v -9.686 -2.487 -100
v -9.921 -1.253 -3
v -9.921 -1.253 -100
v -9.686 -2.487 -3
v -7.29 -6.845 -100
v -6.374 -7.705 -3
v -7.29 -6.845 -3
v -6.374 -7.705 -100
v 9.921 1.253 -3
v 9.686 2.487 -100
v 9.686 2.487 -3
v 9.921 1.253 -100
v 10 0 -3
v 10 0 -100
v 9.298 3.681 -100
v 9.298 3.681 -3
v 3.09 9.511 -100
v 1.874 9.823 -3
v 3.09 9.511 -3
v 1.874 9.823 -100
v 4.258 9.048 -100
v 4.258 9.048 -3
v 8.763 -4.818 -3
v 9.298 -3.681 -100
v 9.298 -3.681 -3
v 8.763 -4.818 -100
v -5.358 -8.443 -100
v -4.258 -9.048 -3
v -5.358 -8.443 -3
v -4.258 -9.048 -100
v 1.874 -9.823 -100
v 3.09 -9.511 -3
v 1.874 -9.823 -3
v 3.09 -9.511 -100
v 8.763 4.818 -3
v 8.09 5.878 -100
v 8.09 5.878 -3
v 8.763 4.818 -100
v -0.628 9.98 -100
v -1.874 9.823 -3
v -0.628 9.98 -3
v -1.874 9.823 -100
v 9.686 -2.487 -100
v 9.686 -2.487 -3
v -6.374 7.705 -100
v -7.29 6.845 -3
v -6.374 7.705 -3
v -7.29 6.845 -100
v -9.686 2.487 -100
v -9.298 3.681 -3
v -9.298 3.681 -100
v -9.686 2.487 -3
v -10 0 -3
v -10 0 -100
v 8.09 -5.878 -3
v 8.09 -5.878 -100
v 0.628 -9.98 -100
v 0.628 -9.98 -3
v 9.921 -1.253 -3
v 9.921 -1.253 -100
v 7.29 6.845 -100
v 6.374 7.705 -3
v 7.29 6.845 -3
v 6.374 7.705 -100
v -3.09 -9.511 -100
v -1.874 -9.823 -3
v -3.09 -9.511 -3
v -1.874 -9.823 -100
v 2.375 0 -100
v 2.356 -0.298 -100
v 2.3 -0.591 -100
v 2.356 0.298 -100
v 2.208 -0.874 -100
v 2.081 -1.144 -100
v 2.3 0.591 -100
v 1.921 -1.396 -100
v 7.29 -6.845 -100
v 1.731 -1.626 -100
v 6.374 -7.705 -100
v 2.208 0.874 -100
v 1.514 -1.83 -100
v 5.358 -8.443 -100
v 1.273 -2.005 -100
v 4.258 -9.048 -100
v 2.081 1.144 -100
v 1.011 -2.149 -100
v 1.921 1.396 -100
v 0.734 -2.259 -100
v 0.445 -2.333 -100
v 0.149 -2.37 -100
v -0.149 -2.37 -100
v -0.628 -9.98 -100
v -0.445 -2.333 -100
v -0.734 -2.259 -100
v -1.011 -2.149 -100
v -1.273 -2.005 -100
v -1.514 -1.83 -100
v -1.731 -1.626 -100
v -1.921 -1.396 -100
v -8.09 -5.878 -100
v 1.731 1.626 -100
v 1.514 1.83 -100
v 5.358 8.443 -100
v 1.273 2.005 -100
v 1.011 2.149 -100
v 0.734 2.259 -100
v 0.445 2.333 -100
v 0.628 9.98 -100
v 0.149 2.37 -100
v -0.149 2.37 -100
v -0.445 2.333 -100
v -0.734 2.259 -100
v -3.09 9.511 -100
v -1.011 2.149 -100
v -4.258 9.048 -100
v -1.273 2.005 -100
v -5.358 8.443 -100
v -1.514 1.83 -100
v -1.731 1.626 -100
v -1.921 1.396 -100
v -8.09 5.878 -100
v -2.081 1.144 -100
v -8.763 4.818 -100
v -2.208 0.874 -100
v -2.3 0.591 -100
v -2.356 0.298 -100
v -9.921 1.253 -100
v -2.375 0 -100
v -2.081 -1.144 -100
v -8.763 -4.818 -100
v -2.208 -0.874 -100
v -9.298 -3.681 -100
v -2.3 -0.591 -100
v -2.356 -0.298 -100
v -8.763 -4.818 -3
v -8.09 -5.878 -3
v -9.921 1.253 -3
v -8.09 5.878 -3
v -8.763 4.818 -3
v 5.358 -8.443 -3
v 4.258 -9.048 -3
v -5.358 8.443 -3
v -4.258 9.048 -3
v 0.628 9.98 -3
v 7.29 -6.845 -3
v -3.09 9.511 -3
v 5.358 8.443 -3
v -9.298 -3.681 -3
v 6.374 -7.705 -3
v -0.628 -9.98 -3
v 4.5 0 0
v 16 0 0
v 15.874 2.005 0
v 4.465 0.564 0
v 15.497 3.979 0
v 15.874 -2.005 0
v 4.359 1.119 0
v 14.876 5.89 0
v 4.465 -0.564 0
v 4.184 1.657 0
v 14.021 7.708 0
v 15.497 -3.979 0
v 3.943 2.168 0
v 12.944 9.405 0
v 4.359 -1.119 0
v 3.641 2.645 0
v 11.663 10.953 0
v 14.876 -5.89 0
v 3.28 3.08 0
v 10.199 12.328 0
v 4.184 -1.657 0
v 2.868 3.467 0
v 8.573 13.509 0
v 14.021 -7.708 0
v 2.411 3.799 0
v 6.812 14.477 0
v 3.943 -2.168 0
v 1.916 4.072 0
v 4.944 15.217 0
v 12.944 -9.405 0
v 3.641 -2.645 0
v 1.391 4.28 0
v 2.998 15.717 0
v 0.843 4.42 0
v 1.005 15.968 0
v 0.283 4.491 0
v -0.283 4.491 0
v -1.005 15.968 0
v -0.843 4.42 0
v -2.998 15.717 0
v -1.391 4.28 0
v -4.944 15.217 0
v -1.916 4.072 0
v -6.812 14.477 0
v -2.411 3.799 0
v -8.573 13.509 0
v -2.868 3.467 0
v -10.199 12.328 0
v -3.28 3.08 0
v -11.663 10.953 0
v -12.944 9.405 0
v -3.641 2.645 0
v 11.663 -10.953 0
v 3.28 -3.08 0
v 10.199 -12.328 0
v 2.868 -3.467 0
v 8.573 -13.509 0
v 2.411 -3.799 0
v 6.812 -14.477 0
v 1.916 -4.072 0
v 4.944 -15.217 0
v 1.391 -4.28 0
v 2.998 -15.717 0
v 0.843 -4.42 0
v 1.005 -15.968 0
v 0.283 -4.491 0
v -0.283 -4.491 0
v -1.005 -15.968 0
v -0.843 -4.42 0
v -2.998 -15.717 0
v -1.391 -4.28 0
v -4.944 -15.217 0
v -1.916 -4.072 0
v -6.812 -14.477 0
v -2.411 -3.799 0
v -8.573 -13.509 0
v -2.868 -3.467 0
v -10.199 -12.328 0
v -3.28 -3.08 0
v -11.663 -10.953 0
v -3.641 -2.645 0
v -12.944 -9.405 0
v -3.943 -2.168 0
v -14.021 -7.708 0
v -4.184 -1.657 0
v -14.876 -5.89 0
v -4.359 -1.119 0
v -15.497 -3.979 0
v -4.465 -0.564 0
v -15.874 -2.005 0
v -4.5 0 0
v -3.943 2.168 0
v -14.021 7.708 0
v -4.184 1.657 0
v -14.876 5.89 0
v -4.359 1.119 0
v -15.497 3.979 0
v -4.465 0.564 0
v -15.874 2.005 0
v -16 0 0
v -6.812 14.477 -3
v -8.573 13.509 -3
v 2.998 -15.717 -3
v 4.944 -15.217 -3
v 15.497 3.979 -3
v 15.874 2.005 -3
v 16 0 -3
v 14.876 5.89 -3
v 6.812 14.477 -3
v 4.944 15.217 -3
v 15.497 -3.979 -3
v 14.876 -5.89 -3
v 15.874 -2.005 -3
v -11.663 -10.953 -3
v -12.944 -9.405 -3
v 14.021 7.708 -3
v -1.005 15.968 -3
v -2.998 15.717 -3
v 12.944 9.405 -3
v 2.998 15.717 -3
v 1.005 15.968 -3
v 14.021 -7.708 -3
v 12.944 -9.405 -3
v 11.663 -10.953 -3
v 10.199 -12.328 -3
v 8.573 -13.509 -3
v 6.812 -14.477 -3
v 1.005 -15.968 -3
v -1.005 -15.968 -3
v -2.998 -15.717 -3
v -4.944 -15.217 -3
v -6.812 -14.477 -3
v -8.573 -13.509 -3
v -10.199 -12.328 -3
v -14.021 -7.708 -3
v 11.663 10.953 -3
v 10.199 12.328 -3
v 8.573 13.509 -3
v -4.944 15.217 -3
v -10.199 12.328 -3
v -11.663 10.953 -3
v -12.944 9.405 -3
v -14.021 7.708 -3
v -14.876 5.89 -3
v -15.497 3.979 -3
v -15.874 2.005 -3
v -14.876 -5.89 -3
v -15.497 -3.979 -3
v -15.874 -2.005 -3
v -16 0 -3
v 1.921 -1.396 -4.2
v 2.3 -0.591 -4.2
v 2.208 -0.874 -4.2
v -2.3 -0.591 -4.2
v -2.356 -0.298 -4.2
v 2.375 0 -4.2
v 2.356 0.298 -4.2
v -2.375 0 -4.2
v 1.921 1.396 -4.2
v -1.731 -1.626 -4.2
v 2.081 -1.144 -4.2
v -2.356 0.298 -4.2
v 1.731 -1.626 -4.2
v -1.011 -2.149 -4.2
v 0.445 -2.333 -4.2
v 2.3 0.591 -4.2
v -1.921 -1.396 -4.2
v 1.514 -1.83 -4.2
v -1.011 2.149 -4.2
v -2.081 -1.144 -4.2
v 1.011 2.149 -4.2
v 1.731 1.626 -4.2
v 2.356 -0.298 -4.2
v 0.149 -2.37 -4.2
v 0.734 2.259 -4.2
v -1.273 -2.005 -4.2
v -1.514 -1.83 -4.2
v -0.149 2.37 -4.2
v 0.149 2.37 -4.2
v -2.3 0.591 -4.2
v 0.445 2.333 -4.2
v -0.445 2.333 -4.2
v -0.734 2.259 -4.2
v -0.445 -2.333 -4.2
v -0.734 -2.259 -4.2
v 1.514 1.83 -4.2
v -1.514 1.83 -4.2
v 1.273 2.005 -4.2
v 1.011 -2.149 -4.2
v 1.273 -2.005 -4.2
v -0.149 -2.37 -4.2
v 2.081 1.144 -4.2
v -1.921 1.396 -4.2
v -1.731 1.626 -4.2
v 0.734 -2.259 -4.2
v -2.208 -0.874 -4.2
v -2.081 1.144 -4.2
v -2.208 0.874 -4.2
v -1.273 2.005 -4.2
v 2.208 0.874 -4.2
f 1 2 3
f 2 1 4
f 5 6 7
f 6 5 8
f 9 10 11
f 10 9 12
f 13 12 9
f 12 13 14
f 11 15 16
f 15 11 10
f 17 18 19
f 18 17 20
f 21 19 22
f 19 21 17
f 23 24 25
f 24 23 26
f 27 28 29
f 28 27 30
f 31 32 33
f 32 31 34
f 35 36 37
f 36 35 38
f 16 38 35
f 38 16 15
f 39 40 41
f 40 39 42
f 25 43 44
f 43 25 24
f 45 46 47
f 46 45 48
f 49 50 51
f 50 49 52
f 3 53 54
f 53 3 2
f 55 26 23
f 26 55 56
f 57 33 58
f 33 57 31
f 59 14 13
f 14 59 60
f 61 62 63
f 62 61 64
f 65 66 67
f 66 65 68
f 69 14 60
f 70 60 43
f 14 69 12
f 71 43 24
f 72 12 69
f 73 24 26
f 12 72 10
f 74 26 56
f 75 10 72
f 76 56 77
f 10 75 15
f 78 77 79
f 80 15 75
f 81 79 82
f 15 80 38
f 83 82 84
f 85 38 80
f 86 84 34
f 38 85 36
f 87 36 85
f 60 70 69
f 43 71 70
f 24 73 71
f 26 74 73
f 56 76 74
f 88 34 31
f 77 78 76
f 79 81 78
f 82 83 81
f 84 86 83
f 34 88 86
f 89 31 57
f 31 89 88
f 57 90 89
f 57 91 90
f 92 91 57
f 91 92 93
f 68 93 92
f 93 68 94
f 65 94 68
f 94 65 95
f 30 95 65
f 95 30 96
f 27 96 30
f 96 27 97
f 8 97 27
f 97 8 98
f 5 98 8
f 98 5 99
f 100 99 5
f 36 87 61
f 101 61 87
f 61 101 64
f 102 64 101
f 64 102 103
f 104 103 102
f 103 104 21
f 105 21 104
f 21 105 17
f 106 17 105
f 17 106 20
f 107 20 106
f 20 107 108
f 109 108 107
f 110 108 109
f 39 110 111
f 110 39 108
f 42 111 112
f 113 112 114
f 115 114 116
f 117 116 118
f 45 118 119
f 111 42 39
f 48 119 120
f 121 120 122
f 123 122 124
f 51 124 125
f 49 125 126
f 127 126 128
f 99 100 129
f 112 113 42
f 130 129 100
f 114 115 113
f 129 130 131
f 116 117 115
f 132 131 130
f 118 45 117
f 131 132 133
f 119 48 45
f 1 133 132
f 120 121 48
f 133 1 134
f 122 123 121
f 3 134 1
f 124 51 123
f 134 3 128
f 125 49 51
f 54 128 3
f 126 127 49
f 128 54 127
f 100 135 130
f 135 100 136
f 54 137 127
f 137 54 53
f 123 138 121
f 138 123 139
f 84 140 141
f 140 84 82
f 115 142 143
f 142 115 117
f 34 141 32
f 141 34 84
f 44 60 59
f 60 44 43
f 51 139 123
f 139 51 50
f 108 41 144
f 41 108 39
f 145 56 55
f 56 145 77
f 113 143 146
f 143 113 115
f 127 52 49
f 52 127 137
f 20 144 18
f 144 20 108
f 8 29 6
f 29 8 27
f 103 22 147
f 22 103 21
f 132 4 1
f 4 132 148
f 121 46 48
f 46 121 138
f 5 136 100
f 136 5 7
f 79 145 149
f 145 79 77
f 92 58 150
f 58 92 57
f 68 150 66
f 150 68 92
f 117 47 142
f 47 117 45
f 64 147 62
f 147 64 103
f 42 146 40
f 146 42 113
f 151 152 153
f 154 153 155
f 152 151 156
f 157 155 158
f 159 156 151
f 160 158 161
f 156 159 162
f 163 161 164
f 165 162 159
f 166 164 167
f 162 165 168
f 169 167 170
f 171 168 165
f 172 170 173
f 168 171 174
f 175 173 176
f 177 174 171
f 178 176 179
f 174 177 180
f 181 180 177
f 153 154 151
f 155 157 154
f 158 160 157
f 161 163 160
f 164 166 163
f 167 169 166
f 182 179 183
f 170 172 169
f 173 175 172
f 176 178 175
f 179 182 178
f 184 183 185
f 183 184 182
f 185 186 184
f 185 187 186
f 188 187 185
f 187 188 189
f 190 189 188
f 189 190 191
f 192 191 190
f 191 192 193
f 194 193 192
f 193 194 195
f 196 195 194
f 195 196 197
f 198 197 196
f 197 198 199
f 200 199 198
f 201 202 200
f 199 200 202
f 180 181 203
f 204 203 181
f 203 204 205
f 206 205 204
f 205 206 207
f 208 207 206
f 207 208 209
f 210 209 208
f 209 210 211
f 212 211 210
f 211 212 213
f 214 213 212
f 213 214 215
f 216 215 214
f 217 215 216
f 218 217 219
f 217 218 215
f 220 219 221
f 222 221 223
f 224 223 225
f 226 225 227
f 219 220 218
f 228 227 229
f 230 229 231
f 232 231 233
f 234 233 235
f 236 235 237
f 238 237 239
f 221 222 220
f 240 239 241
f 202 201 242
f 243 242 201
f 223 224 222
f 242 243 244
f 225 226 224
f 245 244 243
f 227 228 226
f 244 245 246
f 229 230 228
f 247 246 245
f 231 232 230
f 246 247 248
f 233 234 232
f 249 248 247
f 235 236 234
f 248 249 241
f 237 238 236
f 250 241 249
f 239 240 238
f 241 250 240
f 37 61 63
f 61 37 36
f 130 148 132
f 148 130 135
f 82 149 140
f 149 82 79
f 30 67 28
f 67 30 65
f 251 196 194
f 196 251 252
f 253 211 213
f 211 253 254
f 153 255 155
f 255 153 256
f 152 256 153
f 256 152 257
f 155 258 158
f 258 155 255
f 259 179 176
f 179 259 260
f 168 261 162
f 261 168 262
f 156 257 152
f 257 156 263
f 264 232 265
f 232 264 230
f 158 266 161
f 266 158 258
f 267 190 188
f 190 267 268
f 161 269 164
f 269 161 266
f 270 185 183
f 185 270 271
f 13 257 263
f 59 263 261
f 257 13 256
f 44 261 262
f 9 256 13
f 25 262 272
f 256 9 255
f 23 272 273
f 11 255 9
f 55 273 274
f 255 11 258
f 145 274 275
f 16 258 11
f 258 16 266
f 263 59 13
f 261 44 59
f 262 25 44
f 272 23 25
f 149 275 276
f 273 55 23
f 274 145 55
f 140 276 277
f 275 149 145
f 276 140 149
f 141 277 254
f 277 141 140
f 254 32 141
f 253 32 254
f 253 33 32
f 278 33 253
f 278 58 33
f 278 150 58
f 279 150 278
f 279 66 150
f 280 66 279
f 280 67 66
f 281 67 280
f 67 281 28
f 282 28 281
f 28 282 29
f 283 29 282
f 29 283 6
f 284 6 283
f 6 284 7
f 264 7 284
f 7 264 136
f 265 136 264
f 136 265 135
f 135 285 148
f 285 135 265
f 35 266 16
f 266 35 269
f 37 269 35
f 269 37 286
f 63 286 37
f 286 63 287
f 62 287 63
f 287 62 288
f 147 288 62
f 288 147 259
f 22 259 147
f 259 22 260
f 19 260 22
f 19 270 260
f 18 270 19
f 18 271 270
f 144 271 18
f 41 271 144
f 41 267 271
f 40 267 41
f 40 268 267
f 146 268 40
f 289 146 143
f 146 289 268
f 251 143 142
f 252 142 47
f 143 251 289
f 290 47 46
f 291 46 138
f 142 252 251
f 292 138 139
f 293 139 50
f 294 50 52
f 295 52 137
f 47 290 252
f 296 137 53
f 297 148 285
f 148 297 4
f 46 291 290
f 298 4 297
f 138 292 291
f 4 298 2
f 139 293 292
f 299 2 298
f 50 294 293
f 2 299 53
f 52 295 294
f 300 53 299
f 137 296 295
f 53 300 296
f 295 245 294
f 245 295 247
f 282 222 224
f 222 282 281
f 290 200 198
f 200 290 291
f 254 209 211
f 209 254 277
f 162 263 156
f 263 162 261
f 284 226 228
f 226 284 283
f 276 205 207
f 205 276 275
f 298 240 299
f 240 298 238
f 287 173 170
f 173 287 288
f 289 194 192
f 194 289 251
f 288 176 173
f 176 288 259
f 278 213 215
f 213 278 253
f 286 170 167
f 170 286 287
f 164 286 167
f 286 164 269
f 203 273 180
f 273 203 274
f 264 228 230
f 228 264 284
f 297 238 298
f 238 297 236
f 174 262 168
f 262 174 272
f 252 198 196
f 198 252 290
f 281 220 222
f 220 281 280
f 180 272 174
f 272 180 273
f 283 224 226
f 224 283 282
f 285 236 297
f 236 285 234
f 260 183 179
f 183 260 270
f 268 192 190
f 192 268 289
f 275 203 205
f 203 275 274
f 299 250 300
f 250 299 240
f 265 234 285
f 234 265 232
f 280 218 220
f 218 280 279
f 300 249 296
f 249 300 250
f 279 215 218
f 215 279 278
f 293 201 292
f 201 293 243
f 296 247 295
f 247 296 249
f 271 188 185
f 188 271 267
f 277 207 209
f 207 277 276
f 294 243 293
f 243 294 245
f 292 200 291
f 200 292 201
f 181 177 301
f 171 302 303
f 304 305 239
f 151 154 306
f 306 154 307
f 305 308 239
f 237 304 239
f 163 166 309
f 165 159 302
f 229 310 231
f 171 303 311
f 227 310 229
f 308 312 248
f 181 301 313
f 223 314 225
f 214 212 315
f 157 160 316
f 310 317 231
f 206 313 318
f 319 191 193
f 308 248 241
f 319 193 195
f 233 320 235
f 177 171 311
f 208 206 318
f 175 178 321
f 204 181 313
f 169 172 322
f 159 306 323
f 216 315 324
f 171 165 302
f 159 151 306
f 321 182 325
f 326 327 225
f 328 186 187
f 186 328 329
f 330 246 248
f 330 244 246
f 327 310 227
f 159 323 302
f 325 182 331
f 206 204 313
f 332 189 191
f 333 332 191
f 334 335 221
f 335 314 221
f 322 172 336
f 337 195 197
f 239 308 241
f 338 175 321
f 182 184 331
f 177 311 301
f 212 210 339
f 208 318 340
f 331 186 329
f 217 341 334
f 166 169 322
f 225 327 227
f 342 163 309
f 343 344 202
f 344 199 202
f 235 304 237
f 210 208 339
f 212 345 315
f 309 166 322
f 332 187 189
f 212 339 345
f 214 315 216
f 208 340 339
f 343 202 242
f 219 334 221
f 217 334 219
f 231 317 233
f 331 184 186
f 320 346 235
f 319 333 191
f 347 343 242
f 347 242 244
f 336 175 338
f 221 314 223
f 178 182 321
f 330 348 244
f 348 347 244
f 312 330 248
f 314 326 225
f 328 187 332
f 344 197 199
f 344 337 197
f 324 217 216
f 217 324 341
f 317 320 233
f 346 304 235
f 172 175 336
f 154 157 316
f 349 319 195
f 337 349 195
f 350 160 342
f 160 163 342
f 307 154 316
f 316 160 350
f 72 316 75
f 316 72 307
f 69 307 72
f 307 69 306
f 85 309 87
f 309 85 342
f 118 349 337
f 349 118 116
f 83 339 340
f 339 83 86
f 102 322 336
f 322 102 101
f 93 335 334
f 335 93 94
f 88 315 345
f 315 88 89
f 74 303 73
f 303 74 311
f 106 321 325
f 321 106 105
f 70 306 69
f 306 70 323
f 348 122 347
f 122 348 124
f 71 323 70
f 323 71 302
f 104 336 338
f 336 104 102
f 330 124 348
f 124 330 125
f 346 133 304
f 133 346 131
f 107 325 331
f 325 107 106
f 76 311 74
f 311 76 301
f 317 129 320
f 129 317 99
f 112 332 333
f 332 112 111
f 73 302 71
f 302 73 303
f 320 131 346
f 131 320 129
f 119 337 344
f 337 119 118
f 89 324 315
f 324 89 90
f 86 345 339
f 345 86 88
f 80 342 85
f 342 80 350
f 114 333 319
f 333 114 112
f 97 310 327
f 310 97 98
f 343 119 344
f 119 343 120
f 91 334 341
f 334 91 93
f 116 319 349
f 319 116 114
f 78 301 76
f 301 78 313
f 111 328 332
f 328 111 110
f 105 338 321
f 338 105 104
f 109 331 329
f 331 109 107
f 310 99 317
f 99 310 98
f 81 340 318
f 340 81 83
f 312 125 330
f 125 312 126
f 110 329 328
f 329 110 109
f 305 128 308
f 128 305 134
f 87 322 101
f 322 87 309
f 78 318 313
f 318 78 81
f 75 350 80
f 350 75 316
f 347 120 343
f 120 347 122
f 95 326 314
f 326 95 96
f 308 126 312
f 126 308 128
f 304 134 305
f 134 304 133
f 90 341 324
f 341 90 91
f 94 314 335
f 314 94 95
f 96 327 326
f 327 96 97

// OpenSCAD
$fn = 50;


difference() {
	union() {
		translate(v = [0, 0, -100.0000000000]) {
			cylinder(h = 100, r = 10.0000000000);
		}
		translate(v = [0, 0, -3.0000000000]) {
			cylinder(h = 3, r = 16.0000000000);
		}
	}
	union() {
		translate(v = [0, 0, 0]) {
			rotate(a = [0, 0, 0]) {
				difference() {
					union() {
						#translate(v = [0, 0, -100.0000000000]) {
							cylinder(h = 100, r = 2.2500000000);
						}
						#translate(v = [0, 0, -4.2000000000]) {
							cylinder(h = 4.2000000000, r1 = 2.3750000000, r2 = 4.5000000000);
						}
						#translate(v = [0, 0, -100.0000000000]) {
							cylinder(h = 100, r = 2.3750000000);
						}
						#translate(v = [0, 0, -100.0000000000]) {
							cylinder(h = 100, r = 2.2500000000);
						}
					}
					union();
				}
			}
		}
	}
}
